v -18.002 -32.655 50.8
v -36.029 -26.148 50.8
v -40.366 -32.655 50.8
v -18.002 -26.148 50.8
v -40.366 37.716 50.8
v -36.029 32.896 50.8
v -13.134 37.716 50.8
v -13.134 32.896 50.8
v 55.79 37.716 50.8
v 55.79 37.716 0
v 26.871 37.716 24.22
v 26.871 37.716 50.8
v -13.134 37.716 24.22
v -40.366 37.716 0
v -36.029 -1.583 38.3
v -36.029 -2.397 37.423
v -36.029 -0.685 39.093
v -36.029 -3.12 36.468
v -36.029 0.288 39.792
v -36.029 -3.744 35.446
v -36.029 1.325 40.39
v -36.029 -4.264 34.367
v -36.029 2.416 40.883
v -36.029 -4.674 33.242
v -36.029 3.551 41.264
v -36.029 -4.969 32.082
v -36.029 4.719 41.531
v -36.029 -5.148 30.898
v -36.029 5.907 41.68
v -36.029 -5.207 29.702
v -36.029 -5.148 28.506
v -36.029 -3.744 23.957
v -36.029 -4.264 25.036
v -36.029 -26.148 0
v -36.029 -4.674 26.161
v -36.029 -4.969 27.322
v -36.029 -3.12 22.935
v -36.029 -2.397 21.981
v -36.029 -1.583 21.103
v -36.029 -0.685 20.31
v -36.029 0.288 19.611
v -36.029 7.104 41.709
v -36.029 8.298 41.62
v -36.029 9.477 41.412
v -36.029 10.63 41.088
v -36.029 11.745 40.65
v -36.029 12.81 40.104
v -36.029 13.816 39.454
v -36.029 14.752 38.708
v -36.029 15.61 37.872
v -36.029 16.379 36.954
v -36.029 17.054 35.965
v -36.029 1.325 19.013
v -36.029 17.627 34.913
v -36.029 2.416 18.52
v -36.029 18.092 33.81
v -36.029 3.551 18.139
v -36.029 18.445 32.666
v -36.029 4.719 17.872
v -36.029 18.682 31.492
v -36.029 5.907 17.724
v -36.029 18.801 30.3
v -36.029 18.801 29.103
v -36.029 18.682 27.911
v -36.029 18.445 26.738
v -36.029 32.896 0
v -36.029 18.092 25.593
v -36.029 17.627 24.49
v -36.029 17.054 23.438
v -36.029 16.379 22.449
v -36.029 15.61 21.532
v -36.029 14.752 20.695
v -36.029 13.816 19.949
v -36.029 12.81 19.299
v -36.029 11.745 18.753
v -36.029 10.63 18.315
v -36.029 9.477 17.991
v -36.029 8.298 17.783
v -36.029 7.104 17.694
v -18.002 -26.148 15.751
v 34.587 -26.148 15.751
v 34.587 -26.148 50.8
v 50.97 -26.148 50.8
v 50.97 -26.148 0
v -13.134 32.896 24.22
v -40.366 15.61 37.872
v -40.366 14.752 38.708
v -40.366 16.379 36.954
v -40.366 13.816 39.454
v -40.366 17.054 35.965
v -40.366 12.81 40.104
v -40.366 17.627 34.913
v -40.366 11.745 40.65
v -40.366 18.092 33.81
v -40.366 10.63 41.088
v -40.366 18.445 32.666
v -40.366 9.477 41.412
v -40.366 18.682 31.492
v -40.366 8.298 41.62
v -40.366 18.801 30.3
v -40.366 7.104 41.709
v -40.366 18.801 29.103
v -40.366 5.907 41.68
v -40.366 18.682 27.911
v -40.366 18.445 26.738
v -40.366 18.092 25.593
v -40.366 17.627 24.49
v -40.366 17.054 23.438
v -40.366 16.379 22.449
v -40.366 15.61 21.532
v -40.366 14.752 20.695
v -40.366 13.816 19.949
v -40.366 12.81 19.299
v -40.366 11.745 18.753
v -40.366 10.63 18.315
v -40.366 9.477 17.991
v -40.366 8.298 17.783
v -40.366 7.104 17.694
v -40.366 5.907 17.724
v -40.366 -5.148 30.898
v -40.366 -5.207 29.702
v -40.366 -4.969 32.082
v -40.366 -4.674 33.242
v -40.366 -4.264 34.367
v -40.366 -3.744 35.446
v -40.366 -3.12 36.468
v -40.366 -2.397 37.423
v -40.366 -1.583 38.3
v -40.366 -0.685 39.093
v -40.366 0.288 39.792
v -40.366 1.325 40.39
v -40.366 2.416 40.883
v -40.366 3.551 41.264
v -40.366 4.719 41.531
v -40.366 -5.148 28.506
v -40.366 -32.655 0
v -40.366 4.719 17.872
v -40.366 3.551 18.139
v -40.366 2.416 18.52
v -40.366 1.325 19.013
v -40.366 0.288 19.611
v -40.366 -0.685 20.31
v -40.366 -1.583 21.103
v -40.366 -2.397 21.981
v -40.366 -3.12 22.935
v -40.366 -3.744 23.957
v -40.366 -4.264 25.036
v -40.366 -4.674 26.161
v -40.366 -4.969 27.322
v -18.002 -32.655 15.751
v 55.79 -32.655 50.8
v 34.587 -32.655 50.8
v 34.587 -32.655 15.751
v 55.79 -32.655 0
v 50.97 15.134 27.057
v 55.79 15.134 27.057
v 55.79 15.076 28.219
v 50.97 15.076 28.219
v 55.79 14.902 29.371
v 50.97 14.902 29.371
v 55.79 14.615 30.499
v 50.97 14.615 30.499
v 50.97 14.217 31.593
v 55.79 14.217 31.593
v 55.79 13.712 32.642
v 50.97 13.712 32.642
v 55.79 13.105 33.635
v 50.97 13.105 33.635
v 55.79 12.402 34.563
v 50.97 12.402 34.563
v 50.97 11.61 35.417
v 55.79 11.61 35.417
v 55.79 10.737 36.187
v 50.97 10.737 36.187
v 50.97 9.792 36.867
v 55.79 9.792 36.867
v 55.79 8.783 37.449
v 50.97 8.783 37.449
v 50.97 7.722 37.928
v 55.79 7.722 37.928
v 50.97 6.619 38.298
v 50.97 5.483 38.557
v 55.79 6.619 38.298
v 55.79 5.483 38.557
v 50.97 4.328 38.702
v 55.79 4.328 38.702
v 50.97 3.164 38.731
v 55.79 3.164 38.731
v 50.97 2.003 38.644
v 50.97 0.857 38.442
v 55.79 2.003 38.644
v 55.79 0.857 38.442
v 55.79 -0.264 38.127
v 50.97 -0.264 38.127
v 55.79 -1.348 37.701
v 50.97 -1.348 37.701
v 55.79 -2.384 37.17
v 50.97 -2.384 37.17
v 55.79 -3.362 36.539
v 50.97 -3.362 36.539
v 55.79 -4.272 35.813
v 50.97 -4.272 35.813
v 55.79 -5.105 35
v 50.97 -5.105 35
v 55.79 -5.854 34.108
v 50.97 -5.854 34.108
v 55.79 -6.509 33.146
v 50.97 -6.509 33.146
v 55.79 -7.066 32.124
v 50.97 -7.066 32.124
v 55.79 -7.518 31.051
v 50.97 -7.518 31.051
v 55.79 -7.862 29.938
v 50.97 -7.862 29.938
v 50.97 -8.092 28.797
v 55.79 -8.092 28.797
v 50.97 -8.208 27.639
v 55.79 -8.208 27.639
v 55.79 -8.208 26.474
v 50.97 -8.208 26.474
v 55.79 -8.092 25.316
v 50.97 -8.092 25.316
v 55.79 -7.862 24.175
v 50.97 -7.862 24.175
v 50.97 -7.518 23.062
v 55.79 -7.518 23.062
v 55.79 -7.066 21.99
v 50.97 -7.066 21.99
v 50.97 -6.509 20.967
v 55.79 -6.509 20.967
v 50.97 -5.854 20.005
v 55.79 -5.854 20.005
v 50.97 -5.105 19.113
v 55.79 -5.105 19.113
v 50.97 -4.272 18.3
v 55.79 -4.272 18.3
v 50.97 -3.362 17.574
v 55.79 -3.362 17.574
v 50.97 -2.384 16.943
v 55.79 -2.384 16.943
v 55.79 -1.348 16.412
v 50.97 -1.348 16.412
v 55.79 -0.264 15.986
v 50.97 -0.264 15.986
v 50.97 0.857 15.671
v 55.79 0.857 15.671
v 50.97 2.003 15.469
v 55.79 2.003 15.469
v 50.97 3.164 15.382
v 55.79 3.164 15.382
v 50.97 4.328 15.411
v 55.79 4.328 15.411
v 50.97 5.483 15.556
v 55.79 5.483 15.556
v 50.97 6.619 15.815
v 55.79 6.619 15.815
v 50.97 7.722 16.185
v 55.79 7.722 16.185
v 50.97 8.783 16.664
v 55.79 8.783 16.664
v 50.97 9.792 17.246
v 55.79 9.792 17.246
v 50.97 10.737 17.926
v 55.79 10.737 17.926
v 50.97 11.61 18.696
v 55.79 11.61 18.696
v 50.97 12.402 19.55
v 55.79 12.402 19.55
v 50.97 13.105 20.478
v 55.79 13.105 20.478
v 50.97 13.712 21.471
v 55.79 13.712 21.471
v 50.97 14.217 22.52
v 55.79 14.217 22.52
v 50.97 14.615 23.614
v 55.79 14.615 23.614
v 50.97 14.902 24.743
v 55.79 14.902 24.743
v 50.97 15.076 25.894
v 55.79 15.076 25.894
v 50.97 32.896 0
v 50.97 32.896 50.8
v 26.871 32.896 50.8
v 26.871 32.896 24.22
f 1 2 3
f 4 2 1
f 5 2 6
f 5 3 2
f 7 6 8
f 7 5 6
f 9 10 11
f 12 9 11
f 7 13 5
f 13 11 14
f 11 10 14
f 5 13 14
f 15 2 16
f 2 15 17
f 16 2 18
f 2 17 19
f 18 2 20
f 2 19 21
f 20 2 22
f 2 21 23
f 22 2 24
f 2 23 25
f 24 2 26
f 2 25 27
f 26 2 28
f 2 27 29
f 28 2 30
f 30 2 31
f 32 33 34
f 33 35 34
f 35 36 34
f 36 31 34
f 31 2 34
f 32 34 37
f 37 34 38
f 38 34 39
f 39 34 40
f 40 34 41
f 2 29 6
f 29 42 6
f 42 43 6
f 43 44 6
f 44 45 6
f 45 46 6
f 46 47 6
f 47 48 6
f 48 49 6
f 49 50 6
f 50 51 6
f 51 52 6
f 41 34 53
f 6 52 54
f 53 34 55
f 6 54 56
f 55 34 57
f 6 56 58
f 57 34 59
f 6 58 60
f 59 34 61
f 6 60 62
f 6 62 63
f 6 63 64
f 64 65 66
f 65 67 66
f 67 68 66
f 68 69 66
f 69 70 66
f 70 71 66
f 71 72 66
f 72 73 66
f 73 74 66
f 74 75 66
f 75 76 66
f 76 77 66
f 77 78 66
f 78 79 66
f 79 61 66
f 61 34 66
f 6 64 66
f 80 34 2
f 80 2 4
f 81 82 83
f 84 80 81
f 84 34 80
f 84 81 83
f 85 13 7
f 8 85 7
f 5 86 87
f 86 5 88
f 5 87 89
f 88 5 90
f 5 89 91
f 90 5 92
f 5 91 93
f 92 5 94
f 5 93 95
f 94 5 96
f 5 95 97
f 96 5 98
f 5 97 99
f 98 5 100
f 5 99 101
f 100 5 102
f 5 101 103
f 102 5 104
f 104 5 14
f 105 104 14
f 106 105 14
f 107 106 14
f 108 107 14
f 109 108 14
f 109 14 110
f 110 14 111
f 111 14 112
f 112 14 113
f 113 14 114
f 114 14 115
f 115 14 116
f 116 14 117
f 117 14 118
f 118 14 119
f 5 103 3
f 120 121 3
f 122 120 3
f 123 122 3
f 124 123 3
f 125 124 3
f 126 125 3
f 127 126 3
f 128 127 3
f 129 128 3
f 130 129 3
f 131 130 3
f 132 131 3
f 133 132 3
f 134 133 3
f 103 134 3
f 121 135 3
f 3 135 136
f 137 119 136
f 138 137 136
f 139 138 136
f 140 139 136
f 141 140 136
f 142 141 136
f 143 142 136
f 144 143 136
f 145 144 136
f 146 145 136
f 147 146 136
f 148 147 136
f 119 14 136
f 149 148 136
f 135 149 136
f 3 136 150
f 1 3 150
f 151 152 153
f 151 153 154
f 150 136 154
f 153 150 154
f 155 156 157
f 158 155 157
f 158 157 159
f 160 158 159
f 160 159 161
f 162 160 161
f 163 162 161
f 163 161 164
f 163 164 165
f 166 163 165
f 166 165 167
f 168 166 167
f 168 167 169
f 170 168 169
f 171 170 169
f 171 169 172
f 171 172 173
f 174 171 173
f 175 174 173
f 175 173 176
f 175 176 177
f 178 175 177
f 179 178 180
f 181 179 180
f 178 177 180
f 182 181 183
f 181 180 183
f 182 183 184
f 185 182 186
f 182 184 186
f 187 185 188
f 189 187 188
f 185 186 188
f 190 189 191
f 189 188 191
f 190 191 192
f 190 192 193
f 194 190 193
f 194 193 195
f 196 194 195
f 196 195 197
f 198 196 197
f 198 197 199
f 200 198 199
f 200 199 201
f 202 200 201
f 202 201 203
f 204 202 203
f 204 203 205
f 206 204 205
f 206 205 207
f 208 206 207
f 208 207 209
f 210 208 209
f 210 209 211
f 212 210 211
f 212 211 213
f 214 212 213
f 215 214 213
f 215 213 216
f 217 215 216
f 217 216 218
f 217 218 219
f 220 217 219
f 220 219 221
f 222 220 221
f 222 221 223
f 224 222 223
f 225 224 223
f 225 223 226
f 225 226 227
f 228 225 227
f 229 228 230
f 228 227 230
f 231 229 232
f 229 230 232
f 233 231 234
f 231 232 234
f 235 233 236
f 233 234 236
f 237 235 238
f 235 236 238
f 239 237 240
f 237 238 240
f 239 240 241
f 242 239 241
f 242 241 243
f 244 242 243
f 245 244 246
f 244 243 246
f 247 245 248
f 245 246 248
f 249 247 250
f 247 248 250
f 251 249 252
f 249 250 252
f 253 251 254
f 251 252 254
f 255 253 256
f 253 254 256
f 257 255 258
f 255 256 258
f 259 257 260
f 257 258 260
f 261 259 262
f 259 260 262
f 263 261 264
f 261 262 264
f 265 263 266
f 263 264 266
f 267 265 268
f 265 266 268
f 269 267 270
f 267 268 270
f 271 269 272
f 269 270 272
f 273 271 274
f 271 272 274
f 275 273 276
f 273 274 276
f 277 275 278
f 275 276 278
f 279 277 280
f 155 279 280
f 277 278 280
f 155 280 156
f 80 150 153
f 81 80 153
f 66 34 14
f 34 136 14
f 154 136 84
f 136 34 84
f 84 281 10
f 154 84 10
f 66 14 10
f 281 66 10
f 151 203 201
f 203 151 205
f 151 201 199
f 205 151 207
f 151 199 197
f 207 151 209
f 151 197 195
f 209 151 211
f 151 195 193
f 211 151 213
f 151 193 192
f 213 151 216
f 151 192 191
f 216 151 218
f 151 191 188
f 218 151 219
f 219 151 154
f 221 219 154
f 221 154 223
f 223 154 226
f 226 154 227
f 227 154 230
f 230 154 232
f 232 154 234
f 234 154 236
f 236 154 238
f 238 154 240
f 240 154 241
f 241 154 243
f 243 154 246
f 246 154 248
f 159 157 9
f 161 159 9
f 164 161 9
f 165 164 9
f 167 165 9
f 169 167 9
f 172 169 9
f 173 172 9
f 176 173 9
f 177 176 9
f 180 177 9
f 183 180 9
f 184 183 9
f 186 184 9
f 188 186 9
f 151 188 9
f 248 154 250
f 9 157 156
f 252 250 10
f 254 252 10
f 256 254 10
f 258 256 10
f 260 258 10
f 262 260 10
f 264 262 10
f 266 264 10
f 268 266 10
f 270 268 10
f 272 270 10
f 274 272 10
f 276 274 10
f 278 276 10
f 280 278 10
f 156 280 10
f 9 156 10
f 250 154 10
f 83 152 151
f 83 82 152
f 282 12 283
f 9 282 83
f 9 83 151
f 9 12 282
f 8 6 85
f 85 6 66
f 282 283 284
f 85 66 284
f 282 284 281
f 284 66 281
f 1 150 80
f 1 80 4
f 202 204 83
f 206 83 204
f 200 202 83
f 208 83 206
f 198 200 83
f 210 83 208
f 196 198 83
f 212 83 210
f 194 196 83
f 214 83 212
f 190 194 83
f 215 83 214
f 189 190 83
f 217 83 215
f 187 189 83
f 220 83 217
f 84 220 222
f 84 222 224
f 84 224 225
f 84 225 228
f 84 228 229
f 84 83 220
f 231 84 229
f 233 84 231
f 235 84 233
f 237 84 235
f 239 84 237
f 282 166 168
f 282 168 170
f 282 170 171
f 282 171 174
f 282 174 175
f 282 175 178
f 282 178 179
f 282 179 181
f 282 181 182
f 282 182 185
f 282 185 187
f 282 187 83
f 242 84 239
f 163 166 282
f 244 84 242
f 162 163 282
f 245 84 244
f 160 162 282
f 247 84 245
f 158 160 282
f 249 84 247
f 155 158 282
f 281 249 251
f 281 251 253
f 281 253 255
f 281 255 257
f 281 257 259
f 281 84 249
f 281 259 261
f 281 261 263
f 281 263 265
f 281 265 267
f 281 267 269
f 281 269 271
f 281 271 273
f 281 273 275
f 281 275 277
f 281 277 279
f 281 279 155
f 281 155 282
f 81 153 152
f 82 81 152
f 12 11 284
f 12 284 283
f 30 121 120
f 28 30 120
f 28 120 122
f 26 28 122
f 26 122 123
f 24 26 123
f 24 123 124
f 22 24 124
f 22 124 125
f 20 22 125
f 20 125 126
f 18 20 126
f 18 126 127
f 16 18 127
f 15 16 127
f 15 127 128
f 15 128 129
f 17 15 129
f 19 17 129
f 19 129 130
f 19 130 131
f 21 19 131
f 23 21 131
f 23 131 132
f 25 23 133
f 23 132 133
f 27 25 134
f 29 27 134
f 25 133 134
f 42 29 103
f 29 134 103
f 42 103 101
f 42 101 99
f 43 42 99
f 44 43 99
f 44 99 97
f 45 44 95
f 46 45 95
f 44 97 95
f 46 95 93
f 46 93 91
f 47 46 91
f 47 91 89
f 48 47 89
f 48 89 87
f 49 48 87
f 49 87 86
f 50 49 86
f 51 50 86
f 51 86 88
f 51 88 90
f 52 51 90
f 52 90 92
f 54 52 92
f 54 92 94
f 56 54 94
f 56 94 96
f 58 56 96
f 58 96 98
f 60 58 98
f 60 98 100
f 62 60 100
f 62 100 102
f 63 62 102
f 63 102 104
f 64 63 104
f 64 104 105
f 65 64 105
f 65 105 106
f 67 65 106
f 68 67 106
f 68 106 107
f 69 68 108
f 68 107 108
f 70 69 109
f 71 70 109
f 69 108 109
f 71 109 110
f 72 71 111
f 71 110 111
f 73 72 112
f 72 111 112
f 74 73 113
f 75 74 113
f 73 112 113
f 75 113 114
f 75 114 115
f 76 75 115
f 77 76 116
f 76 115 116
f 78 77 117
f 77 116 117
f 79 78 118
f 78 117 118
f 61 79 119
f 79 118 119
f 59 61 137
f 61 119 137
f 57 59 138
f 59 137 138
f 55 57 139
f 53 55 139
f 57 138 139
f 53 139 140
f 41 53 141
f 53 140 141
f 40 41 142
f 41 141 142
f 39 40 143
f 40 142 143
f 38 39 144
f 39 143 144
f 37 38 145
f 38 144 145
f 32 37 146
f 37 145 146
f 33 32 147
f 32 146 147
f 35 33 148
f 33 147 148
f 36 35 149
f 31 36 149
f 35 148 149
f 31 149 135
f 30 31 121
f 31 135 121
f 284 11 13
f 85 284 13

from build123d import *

# Parameters (mm, degrees)
F0_W     = 86.9988277555
F0_H     = 59.0435229242
F1_DEPTH = 50.8
F3_W     = 52.5893084705
F3_H     = 35.0492546886
F4_DEPTH = 25.4
F5_W     = 40.0050003082
F5_H     = 26.5801052183
F6_DEPTH = 25.4
F2_R     = 12.0116475693
F7_DEPTH = 25.4
F8_R     = 11.6783182931
F9_DEPTH = 25.4


with BuildPart() as f1:
    # F0 (on Top) → F1 (new body)
    with BuildSketch(Plane.XY):
        Polygon((55.7901114225, 37.7155579627), (-40.3664931655, 37.7155579627), (-40.3664931655, 32.8956767917), (-40.3664931655, -26.1478461325), (-40.3664931655, -32.654684037), (50.9702265263, -32.654684037), (55.7901114225, -32.654684037), (55.7901114225, 32.8956767917), align=None)
        with Locations((7.4708126485, 3.3739153296)):
            Rectangle(F0_W, F0_H, mode=Mode.SUBTRACT)
    extrude(amount=F1_DEPTH)

    # F3 (on face) → F4 (cut)
    with BuildSketch(Plane.XZ.offset(32.654684037)):
        with Locations((8.2922223955, 33.2753726557)):
            Rectangle(F3_W, F3_H)
    extrude(amount=-F4_DEPTH, mode=Mode.SUBTRACT)

    # F5 (on face) → F6 (cut)
    with BuildSketch(Plane(origin=(0, 37.7155579627, 0), x_dir=(-1, 0, 0), z_dir=(0, 1, 0))):
        with Locations((-6.8683279678, 37.5099473909)):
            Rectangle(F5_W, F5_H)
    extrude(amount=-F6_DEPTH, mode=Mode.SUBTRACT)

    # F2 (on face) → F7 (cut)
    with BuildSketch(Plane(origin=(-40.3664931655, 0, 0), x_dir=(0, -1, 0), z_dir=(-1, 0, 0))):
        with Locations((-6.8044061773, 29.7015700489)):
            Circle(F2_R)
    extrude(amount=-F7_DEPTH, mode=Mode.SUBTRACT)

    # F8 (on face) → F9 (cut)
    with BuildSketch(Plane.YZ.offset(55.7901114225)):
        with Locations((3.4555627499, 27.0565394312)):
            Circle(F8_R)
    extrude(amount=-F9_DEPTH, mode=Mode.SUBTRACT)


solid = f1.part
